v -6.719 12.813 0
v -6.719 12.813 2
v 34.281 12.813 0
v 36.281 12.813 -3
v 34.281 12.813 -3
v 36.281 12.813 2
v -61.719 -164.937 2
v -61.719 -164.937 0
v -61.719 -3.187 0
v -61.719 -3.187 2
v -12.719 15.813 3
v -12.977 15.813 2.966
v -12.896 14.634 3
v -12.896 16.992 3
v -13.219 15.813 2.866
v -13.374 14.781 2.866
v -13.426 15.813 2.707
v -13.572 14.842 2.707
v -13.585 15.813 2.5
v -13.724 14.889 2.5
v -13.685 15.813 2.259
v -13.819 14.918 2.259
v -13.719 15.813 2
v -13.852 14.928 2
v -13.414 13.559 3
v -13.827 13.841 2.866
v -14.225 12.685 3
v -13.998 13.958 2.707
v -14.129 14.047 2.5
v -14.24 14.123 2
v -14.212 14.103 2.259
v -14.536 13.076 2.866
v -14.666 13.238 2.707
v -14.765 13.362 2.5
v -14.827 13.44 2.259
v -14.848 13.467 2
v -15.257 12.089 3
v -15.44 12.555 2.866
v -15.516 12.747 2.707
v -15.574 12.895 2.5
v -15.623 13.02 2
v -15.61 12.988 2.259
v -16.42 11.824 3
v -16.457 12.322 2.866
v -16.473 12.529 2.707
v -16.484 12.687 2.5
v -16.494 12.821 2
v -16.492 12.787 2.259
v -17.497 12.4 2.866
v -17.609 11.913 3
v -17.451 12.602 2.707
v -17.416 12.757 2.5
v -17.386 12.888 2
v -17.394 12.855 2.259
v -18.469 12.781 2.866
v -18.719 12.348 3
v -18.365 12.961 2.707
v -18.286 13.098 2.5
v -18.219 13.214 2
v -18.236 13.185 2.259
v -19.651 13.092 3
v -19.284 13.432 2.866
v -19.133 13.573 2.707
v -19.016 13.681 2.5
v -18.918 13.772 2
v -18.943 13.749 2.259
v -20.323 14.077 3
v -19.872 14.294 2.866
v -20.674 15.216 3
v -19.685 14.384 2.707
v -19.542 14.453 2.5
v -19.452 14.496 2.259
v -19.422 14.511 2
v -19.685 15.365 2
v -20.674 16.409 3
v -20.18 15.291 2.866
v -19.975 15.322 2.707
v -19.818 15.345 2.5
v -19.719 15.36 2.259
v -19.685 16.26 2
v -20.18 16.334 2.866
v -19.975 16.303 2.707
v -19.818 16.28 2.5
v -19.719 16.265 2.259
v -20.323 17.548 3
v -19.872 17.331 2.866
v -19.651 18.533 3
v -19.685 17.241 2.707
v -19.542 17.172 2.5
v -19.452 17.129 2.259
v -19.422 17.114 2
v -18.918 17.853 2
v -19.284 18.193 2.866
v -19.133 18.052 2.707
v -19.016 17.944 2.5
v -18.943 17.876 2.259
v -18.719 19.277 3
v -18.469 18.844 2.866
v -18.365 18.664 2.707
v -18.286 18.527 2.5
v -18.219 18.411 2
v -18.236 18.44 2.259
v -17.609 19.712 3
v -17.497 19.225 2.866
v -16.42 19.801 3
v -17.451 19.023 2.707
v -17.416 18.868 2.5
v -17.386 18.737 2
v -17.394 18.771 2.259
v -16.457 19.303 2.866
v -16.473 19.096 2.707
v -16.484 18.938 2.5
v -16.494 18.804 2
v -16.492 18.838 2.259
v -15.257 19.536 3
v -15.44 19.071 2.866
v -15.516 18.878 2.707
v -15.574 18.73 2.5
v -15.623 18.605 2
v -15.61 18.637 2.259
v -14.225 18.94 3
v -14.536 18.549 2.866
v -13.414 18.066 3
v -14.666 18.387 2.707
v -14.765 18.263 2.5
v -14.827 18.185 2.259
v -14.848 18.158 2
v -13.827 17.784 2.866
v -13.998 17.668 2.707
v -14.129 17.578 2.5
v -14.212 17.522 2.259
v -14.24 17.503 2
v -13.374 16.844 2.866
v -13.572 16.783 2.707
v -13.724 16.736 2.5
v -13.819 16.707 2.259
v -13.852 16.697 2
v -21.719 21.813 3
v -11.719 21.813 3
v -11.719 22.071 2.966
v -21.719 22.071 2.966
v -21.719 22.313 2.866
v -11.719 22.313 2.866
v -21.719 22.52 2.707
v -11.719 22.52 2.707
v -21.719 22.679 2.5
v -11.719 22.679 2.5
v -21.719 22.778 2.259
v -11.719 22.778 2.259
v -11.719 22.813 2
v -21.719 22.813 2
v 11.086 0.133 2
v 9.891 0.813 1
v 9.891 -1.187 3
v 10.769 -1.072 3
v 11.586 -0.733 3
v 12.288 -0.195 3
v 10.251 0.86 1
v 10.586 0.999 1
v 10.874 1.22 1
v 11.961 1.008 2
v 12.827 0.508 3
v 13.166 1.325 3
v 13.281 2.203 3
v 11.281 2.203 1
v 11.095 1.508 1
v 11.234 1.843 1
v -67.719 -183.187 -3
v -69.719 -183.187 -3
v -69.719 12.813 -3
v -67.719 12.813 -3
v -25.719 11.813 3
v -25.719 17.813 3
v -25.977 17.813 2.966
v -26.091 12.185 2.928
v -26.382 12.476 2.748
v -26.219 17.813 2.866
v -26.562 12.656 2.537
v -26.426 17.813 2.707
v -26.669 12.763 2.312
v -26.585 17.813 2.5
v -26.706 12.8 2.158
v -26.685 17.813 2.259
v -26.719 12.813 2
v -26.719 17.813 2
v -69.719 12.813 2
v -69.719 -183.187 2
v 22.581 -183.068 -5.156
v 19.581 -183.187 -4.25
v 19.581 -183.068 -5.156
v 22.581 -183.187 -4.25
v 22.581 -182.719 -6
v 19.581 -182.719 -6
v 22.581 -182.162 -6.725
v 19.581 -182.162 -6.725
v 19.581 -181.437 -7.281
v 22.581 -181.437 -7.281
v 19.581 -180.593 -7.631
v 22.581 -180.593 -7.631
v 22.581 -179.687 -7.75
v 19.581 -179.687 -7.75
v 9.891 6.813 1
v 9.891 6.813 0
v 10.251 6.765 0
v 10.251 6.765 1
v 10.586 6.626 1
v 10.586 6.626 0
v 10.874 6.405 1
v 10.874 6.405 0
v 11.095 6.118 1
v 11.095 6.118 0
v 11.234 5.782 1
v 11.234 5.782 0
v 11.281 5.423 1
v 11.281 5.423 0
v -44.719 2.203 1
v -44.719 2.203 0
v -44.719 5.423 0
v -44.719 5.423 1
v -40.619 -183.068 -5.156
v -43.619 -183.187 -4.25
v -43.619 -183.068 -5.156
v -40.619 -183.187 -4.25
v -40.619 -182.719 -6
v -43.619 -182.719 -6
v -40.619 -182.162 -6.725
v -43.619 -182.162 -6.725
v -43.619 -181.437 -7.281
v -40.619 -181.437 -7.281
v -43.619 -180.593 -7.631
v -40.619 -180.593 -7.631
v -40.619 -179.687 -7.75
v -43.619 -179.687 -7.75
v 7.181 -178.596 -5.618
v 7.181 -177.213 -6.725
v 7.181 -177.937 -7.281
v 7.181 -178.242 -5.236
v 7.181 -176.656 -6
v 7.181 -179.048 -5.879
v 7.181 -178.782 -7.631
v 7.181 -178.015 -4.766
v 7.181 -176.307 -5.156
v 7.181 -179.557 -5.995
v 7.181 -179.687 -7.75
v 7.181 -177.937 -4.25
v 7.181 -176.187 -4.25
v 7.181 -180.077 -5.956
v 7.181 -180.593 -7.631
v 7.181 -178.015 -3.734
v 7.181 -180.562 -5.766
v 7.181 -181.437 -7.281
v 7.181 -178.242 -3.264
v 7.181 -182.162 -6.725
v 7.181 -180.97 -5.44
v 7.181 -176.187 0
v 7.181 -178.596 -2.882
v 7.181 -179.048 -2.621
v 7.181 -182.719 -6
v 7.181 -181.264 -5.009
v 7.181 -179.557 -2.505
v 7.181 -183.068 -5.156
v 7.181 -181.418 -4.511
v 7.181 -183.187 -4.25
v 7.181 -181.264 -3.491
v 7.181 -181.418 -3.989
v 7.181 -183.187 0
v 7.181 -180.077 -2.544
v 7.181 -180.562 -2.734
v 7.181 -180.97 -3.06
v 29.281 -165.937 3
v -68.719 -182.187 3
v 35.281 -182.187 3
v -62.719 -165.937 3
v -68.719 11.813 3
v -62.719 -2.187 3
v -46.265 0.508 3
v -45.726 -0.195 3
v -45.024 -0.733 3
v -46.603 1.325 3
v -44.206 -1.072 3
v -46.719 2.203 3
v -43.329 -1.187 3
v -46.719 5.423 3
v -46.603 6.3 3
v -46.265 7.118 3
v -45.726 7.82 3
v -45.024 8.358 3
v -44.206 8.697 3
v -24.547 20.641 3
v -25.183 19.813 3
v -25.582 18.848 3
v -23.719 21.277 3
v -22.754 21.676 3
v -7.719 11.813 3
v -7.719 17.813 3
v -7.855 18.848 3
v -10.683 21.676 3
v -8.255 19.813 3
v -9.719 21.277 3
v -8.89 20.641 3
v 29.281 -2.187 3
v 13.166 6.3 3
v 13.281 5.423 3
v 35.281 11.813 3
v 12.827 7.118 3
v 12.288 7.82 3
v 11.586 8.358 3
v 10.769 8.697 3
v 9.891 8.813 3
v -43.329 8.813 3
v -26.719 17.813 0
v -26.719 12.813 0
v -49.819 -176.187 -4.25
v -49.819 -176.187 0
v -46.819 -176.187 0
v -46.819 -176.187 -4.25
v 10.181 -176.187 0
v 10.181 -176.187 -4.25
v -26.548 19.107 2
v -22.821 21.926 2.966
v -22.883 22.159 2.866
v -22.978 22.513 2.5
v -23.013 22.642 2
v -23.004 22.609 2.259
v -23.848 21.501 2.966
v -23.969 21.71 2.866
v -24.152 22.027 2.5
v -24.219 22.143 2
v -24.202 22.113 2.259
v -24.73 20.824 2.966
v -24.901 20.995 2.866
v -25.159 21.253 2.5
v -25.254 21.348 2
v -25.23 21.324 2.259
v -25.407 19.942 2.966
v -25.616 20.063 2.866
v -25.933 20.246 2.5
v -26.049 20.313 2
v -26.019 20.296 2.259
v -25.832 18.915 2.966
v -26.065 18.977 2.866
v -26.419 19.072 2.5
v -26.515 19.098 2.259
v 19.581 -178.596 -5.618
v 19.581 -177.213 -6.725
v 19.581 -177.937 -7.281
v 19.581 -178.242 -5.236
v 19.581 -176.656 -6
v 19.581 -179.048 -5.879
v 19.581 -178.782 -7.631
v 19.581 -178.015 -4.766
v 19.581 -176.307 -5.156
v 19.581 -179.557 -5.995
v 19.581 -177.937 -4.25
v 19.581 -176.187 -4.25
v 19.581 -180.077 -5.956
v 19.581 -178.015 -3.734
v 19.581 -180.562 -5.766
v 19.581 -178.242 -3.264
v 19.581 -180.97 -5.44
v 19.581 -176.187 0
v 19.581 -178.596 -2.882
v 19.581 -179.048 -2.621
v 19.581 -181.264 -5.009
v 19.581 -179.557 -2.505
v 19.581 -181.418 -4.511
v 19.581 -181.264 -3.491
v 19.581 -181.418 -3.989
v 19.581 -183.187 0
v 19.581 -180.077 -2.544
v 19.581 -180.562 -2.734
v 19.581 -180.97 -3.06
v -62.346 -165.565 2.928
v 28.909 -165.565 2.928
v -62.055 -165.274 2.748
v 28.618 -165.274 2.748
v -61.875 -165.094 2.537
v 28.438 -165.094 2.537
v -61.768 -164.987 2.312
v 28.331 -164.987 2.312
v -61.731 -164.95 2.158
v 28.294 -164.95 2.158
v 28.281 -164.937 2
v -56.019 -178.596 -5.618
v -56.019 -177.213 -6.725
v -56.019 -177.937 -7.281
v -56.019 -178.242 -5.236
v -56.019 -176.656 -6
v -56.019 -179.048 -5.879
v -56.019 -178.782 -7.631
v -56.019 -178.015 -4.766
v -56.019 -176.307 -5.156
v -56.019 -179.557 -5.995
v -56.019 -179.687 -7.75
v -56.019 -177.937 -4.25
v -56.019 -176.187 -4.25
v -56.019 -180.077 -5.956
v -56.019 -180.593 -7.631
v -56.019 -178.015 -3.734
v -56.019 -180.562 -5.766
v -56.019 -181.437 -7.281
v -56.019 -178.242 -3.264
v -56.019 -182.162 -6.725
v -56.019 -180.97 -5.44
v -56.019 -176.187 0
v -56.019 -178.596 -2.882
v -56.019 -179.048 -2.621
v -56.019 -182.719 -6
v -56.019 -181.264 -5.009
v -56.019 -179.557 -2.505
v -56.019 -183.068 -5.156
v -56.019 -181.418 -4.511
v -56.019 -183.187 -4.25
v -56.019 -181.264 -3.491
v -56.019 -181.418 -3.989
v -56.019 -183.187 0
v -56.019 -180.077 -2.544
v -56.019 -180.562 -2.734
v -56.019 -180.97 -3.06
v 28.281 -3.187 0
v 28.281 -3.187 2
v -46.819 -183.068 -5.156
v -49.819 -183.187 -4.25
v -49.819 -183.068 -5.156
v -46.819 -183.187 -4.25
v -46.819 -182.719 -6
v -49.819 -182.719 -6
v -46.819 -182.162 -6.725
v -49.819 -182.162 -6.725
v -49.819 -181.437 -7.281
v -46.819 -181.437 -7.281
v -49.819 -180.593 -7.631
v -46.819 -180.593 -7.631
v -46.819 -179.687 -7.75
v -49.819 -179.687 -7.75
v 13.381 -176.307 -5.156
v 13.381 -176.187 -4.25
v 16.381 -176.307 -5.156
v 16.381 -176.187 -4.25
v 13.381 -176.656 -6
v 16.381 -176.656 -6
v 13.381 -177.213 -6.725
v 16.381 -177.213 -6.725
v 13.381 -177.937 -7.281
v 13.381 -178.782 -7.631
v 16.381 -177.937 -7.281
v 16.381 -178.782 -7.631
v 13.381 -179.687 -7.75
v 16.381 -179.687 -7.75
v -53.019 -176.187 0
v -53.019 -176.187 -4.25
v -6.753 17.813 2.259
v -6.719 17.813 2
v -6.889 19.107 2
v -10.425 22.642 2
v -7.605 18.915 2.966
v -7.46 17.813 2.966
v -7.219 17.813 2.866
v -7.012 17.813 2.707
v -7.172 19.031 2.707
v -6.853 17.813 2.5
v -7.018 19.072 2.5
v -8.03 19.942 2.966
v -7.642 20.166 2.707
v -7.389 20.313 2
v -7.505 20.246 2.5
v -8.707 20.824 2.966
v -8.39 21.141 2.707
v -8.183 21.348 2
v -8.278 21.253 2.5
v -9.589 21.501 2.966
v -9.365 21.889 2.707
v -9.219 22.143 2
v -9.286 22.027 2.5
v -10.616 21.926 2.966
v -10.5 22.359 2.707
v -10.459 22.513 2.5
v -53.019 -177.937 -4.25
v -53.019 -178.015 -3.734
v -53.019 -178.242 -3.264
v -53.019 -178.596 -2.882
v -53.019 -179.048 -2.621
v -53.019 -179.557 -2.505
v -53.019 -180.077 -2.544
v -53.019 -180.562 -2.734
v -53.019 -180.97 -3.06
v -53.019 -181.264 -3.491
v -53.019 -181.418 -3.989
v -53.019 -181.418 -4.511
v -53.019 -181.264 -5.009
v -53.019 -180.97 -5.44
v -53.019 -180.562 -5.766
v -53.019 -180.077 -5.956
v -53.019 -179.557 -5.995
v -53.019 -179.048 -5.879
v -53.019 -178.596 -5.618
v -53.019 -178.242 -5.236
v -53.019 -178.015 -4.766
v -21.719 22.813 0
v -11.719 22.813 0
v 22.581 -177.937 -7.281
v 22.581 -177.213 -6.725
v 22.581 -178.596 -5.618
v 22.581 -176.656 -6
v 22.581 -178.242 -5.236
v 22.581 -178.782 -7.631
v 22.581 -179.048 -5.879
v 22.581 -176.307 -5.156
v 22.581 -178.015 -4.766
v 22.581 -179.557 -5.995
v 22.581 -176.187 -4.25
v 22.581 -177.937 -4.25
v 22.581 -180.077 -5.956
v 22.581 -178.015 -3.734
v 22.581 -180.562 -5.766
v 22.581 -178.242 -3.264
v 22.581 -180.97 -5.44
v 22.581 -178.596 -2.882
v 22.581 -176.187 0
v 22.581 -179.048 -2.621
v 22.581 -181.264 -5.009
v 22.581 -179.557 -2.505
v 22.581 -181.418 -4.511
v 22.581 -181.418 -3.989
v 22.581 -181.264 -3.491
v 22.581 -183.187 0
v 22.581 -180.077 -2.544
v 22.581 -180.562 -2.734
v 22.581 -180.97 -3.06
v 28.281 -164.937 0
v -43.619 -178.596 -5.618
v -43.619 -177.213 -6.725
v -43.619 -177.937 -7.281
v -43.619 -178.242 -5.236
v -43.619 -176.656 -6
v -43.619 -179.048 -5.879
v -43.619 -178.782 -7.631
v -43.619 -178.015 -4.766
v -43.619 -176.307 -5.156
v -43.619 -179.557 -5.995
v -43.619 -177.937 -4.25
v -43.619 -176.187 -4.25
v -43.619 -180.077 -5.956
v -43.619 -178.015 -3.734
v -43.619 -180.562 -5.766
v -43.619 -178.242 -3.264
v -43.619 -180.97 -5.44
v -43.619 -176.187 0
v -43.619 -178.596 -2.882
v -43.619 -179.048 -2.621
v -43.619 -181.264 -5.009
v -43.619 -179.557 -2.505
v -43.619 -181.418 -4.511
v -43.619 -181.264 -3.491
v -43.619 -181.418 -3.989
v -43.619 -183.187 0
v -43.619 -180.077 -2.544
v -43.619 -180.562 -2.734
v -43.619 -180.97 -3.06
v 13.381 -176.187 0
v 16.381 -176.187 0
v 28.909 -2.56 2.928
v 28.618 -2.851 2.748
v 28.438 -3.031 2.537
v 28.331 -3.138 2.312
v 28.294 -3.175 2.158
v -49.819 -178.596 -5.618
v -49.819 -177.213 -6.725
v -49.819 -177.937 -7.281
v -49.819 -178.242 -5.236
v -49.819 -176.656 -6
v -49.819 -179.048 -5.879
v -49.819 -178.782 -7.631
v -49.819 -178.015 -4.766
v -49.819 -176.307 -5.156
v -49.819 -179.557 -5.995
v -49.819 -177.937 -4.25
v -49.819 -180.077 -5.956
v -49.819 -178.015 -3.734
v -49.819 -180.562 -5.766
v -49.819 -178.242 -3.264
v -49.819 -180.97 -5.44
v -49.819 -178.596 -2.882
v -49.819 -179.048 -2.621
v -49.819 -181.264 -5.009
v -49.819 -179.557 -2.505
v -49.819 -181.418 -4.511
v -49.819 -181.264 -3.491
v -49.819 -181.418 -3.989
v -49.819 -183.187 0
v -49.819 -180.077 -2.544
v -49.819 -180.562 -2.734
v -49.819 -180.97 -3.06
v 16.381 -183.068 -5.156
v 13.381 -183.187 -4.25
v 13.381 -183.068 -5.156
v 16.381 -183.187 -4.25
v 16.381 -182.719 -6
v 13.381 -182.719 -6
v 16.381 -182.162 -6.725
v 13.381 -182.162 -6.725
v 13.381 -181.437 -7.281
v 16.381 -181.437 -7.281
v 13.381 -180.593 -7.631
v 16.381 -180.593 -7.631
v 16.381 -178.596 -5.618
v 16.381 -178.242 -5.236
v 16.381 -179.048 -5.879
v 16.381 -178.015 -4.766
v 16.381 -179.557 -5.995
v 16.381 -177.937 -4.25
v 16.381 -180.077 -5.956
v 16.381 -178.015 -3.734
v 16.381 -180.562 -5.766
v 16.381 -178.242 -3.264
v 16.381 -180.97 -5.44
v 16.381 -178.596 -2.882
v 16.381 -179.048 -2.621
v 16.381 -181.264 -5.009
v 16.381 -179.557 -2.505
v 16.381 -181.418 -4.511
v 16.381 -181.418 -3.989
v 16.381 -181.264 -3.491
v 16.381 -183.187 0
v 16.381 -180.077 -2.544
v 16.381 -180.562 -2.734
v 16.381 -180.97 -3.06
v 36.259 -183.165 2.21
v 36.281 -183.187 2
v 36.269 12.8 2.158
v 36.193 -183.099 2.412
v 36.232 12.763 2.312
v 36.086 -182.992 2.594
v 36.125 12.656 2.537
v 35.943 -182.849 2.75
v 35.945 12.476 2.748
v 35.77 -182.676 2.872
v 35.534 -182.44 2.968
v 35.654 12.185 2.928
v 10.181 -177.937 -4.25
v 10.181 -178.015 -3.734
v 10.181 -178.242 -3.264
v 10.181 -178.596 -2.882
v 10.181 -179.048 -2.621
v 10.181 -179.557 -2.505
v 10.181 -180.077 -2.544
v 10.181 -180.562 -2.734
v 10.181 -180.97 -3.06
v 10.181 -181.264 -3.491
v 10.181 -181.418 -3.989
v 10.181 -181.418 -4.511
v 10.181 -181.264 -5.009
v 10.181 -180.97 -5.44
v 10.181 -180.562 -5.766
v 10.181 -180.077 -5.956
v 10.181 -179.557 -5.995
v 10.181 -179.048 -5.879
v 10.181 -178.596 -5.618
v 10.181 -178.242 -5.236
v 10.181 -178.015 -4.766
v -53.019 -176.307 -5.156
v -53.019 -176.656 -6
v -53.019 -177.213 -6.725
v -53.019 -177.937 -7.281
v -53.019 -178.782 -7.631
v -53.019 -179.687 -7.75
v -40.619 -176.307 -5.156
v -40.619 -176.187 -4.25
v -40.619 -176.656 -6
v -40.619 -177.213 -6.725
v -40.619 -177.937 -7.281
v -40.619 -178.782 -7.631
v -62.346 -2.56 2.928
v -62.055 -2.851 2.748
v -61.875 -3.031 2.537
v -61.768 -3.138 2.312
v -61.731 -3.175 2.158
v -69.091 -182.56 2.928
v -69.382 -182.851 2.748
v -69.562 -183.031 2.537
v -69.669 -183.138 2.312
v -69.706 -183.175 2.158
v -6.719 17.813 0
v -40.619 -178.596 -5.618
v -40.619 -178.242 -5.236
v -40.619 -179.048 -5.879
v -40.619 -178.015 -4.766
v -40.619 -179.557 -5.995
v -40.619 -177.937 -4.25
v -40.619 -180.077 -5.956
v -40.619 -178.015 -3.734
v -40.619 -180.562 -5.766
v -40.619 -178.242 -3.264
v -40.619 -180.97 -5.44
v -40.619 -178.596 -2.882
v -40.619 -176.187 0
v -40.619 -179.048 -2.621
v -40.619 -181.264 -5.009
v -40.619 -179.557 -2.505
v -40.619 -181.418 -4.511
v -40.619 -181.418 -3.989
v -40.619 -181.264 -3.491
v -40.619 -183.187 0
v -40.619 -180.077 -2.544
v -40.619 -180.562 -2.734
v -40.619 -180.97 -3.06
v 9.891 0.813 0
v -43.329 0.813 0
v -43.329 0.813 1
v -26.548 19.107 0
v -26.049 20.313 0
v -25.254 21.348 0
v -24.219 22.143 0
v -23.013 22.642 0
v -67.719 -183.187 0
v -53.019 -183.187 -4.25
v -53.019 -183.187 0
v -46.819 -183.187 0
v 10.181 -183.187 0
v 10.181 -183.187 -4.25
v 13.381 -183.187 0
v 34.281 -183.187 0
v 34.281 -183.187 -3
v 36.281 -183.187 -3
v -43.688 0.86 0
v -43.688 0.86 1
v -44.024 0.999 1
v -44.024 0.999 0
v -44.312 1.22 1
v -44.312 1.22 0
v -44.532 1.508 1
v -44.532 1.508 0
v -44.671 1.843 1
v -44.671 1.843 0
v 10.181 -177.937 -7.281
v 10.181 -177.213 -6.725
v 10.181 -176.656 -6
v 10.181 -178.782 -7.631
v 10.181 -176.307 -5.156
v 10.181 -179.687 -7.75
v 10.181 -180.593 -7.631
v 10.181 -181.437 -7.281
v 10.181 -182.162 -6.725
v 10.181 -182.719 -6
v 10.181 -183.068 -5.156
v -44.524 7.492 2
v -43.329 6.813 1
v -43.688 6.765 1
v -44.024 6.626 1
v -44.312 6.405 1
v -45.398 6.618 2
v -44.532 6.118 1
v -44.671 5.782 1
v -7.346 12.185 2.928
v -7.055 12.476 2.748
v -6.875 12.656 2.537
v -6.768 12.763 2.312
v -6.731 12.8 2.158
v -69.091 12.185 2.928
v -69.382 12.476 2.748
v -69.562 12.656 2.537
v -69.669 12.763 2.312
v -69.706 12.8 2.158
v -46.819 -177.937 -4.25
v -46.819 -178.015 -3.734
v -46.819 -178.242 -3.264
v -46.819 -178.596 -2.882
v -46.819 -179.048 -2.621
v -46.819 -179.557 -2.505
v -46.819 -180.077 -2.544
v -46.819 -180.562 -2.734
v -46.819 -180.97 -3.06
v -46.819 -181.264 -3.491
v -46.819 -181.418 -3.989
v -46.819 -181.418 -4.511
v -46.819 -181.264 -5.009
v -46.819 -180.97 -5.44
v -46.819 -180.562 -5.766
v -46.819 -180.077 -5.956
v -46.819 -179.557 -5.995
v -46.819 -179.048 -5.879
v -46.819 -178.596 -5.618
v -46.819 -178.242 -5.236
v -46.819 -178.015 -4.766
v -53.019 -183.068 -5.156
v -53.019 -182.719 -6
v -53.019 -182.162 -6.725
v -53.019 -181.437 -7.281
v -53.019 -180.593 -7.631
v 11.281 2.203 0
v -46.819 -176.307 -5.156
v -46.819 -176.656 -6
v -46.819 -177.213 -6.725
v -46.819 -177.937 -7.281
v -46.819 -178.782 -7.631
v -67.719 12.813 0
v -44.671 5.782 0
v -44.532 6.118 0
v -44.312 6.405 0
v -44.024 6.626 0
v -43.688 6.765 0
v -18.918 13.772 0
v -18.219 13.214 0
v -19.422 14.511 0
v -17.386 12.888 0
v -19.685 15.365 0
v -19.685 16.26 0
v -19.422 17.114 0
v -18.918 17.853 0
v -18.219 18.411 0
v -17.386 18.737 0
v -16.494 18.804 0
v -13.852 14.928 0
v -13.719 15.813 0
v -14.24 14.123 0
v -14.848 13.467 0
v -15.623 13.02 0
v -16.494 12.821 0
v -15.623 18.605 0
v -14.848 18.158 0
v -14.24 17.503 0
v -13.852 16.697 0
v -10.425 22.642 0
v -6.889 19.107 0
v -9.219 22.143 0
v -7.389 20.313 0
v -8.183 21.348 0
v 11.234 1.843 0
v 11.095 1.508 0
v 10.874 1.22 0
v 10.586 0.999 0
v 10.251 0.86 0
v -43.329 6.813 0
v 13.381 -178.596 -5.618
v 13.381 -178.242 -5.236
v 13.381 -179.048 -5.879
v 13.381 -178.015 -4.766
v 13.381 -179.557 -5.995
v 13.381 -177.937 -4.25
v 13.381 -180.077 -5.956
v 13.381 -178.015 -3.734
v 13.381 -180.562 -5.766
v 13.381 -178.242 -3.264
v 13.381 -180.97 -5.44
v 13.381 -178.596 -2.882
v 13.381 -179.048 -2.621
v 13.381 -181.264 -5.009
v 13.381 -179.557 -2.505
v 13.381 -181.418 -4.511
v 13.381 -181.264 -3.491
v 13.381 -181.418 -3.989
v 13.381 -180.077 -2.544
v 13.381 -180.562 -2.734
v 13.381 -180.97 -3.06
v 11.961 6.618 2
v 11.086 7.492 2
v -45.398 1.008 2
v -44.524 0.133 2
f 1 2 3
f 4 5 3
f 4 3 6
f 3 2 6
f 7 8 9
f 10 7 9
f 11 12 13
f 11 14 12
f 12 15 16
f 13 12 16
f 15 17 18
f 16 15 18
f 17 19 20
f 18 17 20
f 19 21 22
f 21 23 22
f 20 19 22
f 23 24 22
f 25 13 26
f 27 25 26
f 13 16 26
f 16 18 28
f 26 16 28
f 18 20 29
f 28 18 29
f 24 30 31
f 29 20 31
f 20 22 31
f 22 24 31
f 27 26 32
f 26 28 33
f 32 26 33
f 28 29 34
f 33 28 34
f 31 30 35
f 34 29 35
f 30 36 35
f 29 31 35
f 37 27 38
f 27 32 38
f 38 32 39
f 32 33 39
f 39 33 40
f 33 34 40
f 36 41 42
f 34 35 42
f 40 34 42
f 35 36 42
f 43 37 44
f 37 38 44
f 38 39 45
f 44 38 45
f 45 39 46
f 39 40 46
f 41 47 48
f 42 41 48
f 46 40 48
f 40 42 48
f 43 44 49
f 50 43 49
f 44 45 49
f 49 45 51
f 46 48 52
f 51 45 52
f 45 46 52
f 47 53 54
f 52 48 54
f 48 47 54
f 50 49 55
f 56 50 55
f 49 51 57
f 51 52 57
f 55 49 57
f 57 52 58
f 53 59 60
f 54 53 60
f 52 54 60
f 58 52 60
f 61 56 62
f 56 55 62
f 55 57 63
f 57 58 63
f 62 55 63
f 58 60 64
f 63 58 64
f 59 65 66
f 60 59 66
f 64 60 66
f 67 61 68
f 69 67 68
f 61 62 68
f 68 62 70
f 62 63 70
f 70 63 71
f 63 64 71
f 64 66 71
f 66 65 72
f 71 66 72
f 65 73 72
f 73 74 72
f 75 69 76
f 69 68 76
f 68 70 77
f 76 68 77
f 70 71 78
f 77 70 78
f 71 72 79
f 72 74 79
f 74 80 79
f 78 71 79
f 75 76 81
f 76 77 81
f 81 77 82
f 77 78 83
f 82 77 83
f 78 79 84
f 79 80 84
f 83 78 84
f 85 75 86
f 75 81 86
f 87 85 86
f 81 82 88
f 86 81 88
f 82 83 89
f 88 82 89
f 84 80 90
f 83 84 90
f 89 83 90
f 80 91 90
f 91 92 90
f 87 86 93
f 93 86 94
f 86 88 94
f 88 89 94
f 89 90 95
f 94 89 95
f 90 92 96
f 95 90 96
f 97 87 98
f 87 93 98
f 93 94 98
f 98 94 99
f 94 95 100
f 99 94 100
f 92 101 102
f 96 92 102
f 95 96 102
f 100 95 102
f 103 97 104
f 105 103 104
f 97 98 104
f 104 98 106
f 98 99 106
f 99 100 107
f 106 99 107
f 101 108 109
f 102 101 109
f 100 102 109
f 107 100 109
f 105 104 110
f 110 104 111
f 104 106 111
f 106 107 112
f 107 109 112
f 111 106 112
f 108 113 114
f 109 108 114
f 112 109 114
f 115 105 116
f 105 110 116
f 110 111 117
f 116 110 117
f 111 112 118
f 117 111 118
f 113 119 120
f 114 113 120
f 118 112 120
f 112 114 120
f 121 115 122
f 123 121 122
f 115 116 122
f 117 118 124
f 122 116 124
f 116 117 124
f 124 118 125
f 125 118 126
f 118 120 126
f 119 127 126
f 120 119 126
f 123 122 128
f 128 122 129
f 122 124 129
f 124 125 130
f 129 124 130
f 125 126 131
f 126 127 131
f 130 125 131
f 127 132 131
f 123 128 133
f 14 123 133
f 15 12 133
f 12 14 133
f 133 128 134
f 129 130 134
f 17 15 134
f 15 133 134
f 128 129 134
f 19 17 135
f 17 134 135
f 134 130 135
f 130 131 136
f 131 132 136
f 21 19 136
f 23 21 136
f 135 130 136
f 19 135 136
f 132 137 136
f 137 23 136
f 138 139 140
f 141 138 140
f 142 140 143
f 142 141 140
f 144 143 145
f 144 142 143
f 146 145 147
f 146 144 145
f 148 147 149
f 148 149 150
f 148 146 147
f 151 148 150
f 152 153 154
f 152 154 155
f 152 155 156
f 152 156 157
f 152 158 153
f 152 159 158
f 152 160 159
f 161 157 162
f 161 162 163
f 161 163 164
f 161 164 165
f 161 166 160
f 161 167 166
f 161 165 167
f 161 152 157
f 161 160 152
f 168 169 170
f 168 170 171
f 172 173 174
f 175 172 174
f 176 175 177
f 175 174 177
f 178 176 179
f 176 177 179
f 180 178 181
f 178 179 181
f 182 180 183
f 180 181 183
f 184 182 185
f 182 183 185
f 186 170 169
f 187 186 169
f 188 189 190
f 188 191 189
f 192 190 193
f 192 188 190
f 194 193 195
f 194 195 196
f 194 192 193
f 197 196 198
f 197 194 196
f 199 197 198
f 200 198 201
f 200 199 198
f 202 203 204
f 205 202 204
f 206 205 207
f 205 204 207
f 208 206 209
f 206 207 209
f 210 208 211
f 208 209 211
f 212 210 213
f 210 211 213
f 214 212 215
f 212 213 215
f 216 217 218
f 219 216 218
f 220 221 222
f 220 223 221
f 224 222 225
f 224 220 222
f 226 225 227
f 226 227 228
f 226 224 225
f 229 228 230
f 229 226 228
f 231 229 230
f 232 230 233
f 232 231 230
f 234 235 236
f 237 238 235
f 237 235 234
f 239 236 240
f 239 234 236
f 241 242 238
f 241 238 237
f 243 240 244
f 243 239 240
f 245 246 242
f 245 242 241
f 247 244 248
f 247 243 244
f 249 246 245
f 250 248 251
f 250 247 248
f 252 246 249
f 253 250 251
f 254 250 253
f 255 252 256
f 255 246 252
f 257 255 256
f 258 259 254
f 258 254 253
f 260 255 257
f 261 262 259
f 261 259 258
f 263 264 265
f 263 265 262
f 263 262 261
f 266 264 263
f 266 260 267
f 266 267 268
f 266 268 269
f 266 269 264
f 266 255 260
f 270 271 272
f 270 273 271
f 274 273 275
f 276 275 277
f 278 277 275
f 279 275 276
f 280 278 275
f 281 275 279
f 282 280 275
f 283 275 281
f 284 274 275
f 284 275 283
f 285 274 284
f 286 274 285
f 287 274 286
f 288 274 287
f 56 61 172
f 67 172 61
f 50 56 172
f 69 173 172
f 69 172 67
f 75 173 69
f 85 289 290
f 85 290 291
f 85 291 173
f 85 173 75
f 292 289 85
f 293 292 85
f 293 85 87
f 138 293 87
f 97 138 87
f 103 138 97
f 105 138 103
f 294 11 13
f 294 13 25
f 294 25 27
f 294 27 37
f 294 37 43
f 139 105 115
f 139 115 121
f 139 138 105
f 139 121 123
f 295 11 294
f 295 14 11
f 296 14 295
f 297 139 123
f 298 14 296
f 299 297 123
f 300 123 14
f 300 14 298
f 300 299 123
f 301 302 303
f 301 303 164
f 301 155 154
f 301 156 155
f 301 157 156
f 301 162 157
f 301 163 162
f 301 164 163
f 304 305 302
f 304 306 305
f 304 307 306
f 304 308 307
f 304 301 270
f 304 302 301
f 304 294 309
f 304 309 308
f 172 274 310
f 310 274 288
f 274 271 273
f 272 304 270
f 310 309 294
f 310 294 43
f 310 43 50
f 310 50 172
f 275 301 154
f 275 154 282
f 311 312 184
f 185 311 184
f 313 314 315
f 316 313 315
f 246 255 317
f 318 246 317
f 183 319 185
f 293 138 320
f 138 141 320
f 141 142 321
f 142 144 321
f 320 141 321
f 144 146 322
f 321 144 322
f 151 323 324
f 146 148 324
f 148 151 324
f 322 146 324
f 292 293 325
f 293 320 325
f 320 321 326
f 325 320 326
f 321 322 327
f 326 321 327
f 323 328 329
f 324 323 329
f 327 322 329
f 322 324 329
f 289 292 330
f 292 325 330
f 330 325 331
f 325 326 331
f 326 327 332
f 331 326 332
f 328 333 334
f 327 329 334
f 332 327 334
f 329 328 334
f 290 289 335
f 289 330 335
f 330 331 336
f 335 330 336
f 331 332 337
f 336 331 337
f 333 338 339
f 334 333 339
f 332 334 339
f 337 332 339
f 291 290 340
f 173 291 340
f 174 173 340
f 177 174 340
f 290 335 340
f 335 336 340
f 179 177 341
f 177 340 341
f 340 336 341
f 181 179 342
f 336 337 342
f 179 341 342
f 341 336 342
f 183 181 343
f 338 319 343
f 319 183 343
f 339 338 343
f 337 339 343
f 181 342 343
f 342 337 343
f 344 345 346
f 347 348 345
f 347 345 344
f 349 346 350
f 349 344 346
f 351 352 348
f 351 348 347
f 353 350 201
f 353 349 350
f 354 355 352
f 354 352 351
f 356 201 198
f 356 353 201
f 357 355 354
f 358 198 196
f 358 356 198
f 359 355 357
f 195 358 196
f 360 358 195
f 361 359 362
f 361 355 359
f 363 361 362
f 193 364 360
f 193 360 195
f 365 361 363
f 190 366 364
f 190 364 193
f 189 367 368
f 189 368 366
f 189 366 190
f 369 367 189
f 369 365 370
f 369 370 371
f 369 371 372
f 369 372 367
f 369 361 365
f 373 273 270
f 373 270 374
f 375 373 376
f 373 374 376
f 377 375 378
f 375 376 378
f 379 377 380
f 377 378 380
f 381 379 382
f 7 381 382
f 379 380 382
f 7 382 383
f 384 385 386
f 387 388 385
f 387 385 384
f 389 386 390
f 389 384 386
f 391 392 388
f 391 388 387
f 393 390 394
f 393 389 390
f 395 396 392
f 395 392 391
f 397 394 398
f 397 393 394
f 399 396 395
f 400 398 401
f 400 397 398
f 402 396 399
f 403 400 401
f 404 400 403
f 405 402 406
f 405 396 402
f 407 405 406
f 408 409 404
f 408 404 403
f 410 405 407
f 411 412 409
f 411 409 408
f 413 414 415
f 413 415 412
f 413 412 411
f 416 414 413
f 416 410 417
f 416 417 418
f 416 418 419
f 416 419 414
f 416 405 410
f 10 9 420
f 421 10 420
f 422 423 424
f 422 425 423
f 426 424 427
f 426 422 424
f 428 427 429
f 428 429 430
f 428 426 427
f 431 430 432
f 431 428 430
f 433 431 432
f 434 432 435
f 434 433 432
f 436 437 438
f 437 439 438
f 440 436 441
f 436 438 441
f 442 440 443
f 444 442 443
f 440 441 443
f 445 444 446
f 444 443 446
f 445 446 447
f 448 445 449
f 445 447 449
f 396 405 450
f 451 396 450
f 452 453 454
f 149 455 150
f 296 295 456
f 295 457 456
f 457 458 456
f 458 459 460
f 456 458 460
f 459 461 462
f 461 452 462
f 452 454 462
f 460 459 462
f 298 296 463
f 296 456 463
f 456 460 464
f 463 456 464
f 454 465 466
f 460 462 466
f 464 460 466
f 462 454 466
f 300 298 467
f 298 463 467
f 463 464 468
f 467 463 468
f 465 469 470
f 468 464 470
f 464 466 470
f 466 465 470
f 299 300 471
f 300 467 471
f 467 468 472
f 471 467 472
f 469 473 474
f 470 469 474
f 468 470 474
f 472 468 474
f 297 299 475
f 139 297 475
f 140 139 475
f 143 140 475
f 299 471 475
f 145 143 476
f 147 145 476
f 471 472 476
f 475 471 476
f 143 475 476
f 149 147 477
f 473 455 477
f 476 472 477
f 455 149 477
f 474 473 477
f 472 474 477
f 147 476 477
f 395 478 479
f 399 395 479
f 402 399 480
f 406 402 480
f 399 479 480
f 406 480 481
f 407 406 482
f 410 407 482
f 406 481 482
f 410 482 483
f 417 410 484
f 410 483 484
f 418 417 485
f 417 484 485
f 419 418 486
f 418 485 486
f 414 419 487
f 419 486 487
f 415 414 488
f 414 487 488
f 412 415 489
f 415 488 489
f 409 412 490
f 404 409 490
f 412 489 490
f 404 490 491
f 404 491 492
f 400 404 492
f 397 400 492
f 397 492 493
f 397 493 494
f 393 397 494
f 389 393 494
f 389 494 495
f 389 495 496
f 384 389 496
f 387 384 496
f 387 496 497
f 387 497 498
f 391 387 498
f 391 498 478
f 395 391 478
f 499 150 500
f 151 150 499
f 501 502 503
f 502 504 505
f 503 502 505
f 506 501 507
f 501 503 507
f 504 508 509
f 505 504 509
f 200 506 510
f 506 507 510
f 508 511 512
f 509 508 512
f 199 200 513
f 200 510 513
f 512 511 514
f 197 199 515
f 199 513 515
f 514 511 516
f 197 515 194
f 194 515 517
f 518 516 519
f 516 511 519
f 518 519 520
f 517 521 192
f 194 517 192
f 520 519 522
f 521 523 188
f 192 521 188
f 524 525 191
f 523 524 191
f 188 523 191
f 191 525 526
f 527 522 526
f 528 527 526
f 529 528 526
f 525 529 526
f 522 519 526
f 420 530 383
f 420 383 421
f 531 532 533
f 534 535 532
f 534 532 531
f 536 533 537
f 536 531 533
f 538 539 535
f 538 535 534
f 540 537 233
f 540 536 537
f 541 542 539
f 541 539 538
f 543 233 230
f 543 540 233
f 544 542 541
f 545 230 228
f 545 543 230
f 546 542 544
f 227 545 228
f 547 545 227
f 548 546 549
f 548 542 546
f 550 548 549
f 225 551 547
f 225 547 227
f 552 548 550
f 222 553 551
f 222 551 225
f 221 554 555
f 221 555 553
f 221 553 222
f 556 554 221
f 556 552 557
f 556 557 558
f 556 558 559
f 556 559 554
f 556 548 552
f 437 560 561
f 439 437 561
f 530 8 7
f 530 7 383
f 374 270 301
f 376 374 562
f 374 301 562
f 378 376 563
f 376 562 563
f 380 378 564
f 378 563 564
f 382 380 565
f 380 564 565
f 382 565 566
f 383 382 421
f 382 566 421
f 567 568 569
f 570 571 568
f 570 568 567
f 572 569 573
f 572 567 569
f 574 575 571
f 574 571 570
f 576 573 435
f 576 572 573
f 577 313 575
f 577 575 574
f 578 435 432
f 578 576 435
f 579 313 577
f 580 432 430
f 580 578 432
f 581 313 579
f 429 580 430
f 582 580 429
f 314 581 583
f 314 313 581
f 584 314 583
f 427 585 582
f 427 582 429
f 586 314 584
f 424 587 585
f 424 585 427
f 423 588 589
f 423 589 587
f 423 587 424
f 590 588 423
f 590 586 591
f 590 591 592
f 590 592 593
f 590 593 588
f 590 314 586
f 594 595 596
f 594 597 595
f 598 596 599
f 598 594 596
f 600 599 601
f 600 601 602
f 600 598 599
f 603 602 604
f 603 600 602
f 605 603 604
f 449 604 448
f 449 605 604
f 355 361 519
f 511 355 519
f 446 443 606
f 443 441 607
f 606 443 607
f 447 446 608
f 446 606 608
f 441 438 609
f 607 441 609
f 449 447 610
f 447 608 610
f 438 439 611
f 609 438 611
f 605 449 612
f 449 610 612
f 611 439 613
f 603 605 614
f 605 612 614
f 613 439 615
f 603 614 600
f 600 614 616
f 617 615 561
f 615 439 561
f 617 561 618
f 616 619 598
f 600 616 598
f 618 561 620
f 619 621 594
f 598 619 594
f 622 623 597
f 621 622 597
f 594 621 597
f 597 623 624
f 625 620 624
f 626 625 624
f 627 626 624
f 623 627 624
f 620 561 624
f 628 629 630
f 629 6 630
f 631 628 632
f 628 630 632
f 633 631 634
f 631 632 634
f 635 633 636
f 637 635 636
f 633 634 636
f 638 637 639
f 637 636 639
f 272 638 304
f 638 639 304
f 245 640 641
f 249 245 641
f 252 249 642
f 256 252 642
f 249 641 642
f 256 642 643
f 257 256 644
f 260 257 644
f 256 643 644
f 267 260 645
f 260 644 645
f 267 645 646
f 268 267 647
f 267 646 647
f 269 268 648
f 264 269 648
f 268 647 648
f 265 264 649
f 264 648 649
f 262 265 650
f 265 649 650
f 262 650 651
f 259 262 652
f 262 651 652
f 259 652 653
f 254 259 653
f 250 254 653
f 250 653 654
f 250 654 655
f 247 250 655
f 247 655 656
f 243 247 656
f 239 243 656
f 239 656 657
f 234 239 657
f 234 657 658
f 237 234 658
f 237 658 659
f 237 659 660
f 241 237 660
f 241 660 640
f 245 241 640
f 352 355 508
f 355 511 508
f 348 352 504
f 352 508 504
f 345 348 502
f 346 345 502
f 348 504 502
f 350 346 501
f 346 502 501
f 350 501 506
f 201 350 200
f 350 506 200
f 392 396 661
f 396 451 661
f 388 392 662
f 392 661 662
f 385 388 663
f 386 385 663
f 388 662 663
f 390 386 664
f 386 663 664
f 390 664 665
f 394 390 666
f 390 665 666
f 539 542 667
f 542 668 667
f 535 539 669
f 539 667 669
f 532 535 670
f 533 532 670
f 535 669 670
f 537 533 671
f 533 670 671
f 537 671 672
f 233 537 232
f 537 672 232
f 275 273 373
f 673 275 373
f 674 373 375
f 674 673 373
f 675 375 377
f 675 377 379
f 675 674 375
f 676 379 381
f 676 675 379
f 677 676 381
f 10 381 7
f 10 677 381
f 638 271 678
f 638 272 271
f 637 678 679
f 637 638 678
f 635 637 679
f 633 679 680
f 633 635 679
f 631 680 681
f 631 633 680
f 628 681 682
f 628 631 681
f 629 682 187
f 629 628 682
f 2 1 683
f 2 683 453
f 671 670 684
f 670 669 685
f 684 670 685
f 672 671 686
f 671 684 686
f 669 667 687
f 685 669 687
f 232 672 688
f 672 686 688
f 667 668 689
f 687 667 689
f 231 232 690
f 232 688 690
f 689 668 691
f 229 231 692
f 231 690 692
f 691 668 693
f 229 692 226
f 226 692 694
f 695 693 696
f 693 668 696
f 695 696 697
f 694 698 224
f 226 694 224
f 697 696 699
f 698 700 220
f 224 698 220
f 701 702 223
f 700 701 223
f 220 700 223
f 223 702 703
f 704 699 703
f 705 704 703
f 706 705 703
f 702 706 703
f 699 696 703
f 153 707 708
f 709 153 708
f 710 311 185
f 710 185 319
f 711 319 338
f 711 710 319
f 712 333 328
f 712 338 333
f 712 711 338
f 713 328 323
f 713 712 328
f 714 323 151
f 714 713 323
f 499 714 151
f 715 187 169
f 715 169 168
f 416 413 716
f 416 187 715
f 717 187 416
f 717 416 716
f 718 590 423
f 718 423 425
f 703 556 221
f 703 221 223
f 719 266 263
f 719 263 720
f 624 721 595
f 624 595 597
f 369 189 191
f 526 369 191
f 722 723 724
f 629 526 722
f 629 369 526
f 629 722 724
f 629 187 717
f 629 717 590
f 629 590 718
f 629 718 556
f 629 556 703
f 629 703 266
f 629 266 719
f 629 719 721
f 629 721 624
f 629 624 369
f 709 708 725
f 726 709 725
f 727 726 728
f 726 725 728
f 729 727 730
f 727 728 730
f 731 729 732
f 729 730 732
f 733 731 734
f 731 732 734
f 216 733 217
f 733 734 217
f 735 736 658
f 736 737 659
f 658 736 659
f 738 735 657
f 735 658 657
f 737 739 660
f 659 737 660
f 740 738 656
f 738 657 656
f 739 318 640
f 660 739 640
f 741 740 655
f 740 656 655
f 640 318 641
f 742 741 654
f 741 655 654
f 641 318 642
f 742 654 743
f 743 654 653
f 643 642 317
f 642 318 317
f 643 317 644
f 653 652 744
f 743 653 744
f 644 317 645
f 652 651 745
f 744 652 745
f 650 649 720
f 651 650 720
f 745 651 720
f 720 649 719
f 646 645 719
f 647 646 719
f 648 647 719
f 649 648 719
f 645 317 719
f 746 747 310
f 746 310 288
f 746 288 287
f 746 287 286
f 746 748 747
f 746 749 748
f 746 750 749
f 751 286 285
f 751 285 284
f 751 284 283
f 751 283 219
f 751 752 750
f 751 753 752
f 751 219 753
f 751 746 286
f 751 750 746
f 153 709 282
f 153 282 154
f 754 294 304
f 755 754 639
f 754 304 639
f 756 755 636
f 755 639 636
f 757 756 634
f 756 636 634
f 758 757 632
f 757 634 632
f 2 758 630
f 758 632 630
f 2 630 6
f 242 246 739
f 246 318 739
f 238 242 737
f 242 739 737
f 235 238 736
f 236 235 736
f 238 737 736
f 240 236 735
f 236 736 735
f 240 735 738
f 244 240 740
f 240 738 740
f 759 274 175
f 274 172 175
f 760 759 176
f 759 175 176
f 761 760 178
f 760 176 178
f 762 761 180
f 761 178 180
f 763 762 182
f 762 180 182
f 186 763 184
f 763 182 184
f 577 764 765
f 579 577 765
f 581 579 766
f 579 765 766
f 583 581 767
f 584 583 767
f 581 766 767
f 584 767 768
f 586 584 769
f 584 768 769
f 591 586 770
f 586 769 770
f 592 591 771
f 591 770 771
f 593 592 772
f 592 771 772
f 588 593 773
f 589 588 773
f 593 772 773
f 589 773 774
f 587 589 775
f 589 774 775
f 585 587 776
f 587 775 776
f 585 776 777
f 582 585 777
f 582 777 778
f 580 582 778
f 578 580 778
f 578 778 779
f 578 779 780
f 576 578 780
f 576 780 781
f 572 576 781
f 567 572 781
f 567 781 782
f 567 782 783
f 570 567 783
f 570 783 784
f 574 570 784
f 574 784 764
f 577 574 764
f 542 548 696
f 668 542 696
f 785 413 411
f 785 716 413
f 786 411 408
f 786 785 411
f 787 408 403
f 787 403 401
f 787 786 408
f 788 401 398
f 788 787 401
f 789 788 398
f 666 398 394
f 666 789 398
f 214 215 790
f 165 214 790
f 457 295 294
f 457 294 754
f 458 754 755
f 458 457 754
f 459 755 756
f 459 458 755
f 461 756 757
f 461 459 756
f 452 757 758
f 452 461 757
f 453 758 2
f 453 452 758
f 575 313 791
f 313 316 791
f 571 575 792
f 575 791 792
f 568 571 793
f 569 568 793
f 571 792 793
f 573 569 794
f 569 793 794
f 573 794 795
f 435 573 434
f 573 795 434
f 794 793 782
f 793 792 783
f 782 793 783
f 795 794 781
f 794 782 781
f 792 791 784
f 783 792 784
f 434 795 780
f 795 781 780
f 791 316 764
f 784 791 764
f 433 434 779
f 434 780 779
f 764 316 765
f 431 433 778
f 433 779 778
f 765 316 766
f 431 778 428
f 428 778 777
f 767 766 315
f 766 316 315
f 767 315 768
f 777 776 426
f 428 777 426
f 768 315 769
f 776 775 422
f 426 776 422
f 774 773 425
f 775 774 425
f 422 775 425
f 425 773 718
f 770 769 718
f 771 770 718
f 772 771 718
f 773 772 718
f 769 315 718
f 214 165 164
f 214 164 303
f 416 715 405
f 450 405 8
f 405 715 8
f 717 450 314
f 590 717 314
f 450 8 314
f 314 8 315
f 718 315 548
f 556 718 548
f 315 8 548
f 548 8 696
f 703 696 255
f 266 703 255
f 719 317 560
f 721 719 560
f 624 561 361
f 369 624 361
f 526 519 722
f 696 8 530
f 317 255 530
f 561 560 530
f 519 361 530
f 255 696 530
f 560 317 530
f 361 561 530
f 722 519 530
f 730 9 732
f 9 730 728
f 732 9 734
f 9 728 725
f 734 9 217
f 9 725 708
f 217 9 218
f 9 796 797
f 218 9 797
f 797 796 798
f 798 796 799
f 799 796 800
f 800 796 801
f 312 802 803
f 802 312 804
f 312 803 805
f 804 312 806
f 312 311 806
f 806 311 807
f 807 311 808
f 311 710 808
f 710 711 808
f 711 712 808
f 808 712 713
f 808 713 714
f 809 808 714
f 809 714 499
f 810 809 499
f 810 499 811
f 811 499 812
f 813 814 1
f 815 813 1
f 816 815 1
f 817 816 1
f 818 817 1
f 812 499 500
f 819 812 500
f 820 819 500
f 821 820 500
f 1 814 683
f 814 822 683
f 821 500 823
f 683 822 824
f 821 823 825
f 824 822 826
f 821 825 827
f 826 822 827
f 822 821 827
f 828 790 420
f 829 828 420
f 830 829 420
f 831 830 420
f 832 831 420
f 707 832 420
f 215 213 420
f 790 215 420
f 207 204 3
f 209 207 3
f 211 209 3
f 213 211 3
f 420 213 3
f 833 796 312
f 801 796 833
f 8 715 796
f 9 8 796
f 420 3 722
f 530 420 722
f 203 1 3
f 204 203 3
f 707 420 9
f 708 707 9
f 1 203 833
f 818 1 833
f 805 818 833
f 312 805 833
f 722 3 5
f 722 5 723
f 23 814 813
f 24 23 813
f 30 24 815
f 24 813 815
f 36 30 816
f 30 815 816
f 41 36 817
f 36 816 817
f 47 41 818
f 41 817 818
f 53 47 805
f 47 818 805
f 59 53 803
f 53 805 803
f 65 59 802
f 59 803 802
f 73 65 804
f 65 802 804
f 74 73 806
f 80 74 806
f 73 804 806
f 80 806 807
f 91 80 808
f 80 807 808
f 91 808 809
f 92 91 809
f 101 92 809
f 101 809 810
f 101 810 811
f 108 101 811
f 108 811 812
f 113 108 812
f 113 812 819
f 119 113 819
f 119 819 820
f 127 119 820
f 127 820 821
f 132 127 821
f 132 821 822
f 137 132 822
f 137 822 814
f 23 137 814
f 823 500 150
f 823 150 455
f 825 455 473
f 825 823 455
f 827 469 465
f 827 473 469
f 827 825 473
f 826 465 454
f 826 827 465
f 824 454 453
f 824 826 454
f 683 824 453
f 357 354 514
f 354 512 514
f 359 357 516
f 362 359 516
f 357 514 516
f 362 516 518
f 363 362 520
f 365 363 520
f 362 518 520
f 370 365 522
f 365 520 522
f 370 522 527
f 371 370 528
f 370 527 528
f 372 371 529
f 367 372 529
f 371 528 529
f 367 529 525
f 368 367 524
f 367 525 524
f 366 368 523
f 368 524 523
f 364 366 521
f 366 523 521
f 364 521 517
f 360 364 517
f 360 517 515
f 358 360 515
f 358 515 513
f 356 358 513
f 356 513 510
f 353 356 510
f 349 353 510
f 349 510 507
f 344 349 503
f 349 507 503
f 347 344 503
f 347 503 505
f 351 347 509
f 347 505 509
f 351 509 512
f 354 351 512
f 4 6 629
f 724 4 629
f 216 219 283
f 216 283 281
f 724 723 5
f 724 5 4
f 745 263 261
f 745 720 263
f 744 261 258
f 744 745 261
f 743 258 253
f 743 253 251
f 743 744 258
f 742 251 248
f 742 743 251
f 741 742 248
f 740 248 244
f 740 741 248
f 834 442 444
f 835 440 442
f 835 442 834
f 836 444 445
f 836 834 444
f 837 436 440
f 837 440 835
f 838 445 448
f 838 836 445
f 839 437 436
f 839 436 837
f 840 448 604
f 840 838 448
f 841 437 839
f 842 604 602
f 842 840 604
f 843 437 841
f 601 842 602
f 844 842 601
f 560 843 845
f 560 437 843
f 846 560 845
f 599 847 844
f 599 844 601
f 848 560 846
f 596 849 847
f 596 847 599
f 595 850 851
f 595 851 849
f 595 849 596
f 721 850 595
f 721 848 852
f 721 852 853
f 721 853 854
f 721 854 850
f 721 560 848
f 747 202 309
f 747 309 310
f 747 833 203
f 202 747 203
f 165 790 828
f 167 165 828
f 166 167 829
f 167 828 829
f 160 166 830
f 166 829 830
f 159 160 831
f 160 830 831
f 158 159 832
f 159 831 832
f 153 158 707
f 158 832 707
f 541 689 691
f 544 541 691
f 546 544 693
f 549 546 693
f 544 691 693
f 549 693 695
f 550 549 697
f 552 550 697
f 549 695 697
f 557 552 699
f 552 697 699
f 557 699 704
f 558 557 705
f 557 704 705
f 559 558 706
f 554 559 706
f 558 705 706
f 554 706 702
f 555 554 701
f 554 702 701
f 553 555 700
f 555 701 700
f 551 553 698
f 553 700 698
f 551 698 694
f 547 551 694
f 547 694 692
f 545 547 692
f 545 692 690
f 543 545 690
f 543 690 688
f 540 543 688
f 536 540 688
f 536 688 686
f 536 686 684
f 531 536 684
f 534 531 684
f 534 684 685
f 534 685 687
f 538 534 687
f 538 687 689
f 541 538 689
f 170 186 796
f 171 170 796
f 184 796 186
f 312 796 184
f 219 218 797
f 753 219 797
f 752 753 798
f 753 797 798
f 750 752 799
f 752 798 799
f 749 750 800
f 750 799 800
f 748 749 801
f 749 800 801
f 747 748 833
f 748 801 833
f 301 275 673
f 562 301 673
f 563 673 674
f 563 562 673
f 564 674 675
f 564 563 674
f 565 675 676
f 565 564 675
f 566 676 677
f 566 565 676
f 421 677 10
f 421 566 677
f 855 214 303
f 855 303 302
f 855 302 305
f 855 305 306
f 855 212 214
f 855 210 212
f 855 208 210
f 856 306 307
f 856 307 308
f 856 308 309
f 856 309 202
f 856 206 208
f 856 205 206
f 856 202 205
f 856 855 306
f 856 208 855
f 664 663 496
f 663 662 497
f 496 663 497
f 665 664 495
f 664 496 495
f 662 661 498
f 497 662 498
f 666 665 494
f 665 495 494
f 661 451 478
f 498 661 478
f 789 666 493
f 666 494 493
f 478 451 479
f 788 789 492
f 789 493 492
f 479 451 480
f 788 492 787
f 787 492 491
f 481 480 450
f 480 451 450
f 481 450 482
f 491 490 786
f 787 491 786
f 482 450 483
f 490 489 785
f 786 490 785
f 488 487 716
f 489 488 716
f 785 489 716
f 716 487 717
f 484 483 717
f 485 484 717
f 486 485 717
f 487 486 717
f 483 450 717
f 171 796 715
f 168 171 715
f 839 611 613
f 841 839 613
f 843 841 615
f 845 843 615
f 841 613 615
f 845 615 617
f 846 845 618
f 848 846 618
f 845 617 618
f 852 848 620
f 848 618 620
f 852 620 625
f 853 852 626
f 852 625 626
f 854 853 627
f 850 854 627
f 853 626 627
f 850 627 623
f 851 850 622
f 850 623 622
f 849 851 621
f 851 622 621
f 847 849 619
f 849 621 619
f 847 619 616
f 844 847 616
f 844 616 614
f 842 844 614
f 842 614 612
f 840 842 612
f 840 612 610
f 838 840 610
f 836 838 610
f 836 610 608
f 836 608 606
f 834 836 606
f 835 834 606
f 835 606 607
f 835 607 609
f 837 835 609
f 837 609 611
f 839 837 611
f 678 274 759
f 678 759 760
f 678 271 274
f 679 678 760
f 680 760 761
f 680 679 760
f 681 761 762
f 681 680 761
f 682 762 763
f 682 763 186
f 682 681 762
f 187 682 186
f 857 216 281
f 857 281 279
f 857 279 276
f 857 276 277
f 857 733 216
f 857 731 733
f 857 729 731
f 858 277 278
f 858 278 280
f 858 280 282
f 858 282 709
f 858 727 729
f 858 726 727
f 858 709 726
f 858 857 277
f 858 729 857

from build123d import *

# Parameters (mm, degrees)
F0_W         = 106
F0_H         = 188.5
F0_W_2       = 90
F0_H_2       = 161.75
F0_H_3       = 7.5
F1_DEPTH     = 3
F2_W         = 3
F2_H         = 7
F3_DEPTH     = 7.75
F4_R         = 3.49999
F5_R         = 1.75
F6_DEPTH     = 86.101
F7_W         = 20
F7_H         = 3
F8_DEPTH     = 10
F9_R         = 3
F10_DEPTH    = 3.001
F11_W        = 2
F11_H        = 196
F12_DEPTH    = 3
F13_R        = 1
F14_R        = 1.75
F15_DEPTH    = 25
F16_T1_DEPTH = 15.5
F16_T4_ANGLE = 90
F16_T6_ANGLE = 90
F18_DEPTH    = 3.0010001
F19_SIZE     = 2


# Not quite as in the source:
# - a fillet or chamfer that OpenCascade refuses, or shapes differently, is made with other operations: its cross-section is extruded or revolved along the edge and cut away or added
# - a fillet or chamfer is up to 0.001 mm smaller than in the source, because OpenCascade refuses the exact size


with BuildPart() as f1:
    # F0 (on Top) → F1 (new body)
    with BuildSketch(Plane.XY):
        with Locations((-16.7186730212, -81.4374315739)):
            Rectangle(F0_W, F0_H)
        with Locations((-16.7186730212, -84.0624315739)):
            Rectangle(F0_W_2, F0_H_2, mode=Mode.SUBTRACT)
        with Locations((-16.7186730212, -179.4374315739)):
            Rectangle(F0_W, F0_H_3)
    extrude(amount=F1_DEPTH)

    # F2 (on face) → F3 (join)
    with BuildSketch(Plane(origin=(0, 0, 0), x_dir=(1, 0, 0), z_dir=(0, 0, -1))):
        with Locations((-48.3186730212, 179.6874315739)):
            Rectangle(F2_W, F2_H)
        with Locations((14.8813269788, 179.6874315739)):
            Rectangle(F2_W, F2_H)
        with Locations((-54.5186730212, 179.6874315739)):
            Rectangle(F2_W, F2_H)
        with Locations((21.0813269788, 179.6874315739)):
            Rectangle(F2_W, F2_H)
        with Locations((-42.1186730212, 179.6874315739)):
            Rectangle(F2_W, F2_H)
        with Locations((8.6813269788, 179.6874315739)):
            Rectangle(F2_W, F2_H)
    extrude(amount=F3_DEPTH)

    # F4 (radius 3.5 in the source; OpenCascade refuses exactly that, so slightly less here)
    f4_edges = [f1.edges().sort_by_distance(p)[0] for p in [
        (-48.318673, -183.187432, -7.75),
        (-48.318673, -176.187432, -7.75),
        (14.881327, -183.187432, -7.75),
        (14.881327, -176.187432, -7.75),
        (-54.518673, -176.187432, -7.75),
        (-54.518673, -183.187432, -7.75),
        (-42.118673, -183.187432, -7.75),
        (-42.118673, -176.187432, -7.75),
        (21.081327, -176.187432, -7.75),
        (8.681327, -176.187432, -7.75),
        (8.681327, -183.187432, -7.75),
        (21.081327, -183.187432, -7.75),
    ]]
    fillet(f4_edges, radius=F4_R)

    # F5 (on face) → F6 (cut, through all)
    with BuildSketch(Plane.YZ.offset(16.3813269788)):
        with Locations((-179.6874315739, -4.25)):
            Circle(F5_R)
    extrude(amount=-F6_DEPTH, mode=Mode.SUBTRACT)

    # F7 (on face) → F8 (join)
    with BuildSketch(Plane(origin=(0, 12.8125684261, 0), x_dir=(-1, 0, 0), z_dir=(0, 1, 0))):
        with Locations((16.7186730212, 1.5)):
            Rectangle(F7_W, F7_H)
    extrude(amount=F8_DEPTH)

    # F9 (on face) → F10 (cut, through all)
    with BuildSketch(Plane(origin=(0, 0, 0), x_dir=(1, 0, 0), z_dir=(0, 0, -1))):
        with Locations((-16.7186730212, -15.8125684261)):
            Circle(F9_R)
    extrude(amount=-F10_DEPTH, mode=Mode.SUBTRACT)

    # F11 (on face) → F12 (join)
    with BuildSketch(Plane(origin=(0, 0, 0), x_dir=(1, 0, 0), z_dir=(0, 0, -1))):
        with Locations((35.2813269788, 85.1874315739)):
            Rectangle(F11_W, F11_H)
        with Locations((-68.7186730212, 85.1874315739)):
            Rectangle(F11_W, F11_H)
    extrude(amount=F12_DEPTH)

    # F13
    f13_edges = [f1.edges().sort_by_distance(p)[0] for p in [
        (14.781327, 12.812568, 3),
        (36.281327, -85.187432, 3),
        (-6.718673, 17.812568, 3),
        (-16.718673, -183.187432, 3),
        (-16.718673, 22.812568, 3),
        (-69.718673, -85.187432, 3),
        (-26.718673, 17.812568, 3),
        (-48.218673, 12.812568, 3),
        (-16.718673, -3.187432, 3),
        (-61.718673, -84.062432, 3),
        (28.281327, -84.062432, 3),
        (-16.718673, -164.937432, 3),
        (-19.718673, 15.812568, 3),
    ]]
    fillet(f13_edges, radius=F13_R)

    # F14 (on face) → F15 (cut)
    with BuildSketch(Plane.YZ.offset(22.5813269788)):
        with Locations((-179.6874315739, -4.25)):
            Circle(F14_R)
    extrude(amount=-F15_DEPTH, mode=Mode.SUBTRACT)

    # F16: fillet of radius 5 on 2 edges, made by hand

    # F16_s2 → F16_t1 (cut)
    with BuildSketch(Plane.XY.offset(-12.5)):
        with BuildLine():
            ThreePointArc((-11.7186730212, 22.8125684261), (-8.1831391152, 21.3481023321), (-6.7186730212, 17.8125684261))
            Line((-6.7186730212, 17.8125684261), (-6.7186730212, 22.8125684261))
            Line((-6.7186730212, 22.8125684261), (-11.7186730212, 22.8125684261))
        make_face()
        with BuildLine():
            ThreePointArc((-26.7186730212, 17.8125684261), (-25.2542069271, 21.3481023321), (-21.7186730212, 22.8125684261))
            Line((-21.7186730212, 22.8125684261), (-26.7186730212, 22.8125684261))
            Line((-26.7186730212, 22.8125684261), (-26.7186730212, 17.8125684261))
        make_face()
    extrude(amount=F16_T1_DEPTH, mode=Mode.SUBTRACT)

    # F16_s3 → F16_t4 (revolve, cut)
    with BuildSketch(Plane.YZ.offset(-21.7186730212)):
        with BuildLine():
            ThreePointArc((21.8125684261, 3), (22.5196752073, 2.7071067812), (22.8125684261, 2))
            Line((22.8125684261, 2), (22.8125684261, 3))
            Line((22.8125684261, 3), (21.8125684261, 3))
        make_face()
    revolve(axis=Axis((-21.7186730212, 17.8125684261, 3), (0, 0, 1)), revolution_arc=F16_T4_ANGLE, mode=Mode.SUBTRACT)

    # F16_s5 → F16_t6 (revolve, cut)
    with BuildSketch(Plane.XZ.offset(-17.8125684261)):
        with BuildLine():
            ThreePointArc((-7.7186730212, 3), (-7.01156624, 2.7071067812), (-6.7186730212, 2))
            Line((-6.7186730212, 2), (-6.7186730212, 3))
            Line((-6.7186730212, 3), (-7.7186730212, 3))
        make_face()
    revolve(axis=Axis((-11.7186730212, 17.8125684261, 3), (0, 0, 1)), revolution_arc=F16_T6_ANGLE, mode=Mode.SUBTRACT)

    # F17 (on face) → F18 (cut, through all)
    with BuildSketch(Plane(origin=(0, 0, 0), x_dir=(1, 0, 0), z_dir=(0, 0, -1))):
        with BuildLine():
            Line((9.8913780288, -0.8125684261), (-43.3287240711, -0.8125684261))
            ThreePointArc((-43.3287240711, -0.8125684261), (-44.3115663992, -1.2196750481), (-44.7186730212, -2.2025173761))
            Line((-44.7186730212, -2.2025173761), (-44.7186730212, -5.4226194761))
            ThreePointArc((-44.7186730212, -5.4226194761), (-44.3115663992, -6.4054618042), (-43.3287240711, -6.8125684261))
            Line((-43.3287240711, -6.8125684261), (9.8913780288, -6.8125684261))
            ThreePointArc((9.8913780288, -6.8125684261), (10.8742203569, -6.4054618042), (11.2813269788, -5.4226194761))
            Line((11.2813269788, -5.4226194761), (11.2813269788, -2.2025173761))
            ThreePointArc((11.2813269788, -2.2025173761), (10.8742203569, -1.2196750481), (9.8913780288, -0.8125684261))
        make_face()
    extrude(amount=-F18_DEPTH, mode=Mode.SUBTRACT)

    # F19
    f19_edges = [f1.edges().sort_by_distance(p)[0] for p in [
        (-16.718673, 6.812568, 3),
    ]]
    chamfer(f19_edges, length=F19_SIZE)


solid = f1.part
